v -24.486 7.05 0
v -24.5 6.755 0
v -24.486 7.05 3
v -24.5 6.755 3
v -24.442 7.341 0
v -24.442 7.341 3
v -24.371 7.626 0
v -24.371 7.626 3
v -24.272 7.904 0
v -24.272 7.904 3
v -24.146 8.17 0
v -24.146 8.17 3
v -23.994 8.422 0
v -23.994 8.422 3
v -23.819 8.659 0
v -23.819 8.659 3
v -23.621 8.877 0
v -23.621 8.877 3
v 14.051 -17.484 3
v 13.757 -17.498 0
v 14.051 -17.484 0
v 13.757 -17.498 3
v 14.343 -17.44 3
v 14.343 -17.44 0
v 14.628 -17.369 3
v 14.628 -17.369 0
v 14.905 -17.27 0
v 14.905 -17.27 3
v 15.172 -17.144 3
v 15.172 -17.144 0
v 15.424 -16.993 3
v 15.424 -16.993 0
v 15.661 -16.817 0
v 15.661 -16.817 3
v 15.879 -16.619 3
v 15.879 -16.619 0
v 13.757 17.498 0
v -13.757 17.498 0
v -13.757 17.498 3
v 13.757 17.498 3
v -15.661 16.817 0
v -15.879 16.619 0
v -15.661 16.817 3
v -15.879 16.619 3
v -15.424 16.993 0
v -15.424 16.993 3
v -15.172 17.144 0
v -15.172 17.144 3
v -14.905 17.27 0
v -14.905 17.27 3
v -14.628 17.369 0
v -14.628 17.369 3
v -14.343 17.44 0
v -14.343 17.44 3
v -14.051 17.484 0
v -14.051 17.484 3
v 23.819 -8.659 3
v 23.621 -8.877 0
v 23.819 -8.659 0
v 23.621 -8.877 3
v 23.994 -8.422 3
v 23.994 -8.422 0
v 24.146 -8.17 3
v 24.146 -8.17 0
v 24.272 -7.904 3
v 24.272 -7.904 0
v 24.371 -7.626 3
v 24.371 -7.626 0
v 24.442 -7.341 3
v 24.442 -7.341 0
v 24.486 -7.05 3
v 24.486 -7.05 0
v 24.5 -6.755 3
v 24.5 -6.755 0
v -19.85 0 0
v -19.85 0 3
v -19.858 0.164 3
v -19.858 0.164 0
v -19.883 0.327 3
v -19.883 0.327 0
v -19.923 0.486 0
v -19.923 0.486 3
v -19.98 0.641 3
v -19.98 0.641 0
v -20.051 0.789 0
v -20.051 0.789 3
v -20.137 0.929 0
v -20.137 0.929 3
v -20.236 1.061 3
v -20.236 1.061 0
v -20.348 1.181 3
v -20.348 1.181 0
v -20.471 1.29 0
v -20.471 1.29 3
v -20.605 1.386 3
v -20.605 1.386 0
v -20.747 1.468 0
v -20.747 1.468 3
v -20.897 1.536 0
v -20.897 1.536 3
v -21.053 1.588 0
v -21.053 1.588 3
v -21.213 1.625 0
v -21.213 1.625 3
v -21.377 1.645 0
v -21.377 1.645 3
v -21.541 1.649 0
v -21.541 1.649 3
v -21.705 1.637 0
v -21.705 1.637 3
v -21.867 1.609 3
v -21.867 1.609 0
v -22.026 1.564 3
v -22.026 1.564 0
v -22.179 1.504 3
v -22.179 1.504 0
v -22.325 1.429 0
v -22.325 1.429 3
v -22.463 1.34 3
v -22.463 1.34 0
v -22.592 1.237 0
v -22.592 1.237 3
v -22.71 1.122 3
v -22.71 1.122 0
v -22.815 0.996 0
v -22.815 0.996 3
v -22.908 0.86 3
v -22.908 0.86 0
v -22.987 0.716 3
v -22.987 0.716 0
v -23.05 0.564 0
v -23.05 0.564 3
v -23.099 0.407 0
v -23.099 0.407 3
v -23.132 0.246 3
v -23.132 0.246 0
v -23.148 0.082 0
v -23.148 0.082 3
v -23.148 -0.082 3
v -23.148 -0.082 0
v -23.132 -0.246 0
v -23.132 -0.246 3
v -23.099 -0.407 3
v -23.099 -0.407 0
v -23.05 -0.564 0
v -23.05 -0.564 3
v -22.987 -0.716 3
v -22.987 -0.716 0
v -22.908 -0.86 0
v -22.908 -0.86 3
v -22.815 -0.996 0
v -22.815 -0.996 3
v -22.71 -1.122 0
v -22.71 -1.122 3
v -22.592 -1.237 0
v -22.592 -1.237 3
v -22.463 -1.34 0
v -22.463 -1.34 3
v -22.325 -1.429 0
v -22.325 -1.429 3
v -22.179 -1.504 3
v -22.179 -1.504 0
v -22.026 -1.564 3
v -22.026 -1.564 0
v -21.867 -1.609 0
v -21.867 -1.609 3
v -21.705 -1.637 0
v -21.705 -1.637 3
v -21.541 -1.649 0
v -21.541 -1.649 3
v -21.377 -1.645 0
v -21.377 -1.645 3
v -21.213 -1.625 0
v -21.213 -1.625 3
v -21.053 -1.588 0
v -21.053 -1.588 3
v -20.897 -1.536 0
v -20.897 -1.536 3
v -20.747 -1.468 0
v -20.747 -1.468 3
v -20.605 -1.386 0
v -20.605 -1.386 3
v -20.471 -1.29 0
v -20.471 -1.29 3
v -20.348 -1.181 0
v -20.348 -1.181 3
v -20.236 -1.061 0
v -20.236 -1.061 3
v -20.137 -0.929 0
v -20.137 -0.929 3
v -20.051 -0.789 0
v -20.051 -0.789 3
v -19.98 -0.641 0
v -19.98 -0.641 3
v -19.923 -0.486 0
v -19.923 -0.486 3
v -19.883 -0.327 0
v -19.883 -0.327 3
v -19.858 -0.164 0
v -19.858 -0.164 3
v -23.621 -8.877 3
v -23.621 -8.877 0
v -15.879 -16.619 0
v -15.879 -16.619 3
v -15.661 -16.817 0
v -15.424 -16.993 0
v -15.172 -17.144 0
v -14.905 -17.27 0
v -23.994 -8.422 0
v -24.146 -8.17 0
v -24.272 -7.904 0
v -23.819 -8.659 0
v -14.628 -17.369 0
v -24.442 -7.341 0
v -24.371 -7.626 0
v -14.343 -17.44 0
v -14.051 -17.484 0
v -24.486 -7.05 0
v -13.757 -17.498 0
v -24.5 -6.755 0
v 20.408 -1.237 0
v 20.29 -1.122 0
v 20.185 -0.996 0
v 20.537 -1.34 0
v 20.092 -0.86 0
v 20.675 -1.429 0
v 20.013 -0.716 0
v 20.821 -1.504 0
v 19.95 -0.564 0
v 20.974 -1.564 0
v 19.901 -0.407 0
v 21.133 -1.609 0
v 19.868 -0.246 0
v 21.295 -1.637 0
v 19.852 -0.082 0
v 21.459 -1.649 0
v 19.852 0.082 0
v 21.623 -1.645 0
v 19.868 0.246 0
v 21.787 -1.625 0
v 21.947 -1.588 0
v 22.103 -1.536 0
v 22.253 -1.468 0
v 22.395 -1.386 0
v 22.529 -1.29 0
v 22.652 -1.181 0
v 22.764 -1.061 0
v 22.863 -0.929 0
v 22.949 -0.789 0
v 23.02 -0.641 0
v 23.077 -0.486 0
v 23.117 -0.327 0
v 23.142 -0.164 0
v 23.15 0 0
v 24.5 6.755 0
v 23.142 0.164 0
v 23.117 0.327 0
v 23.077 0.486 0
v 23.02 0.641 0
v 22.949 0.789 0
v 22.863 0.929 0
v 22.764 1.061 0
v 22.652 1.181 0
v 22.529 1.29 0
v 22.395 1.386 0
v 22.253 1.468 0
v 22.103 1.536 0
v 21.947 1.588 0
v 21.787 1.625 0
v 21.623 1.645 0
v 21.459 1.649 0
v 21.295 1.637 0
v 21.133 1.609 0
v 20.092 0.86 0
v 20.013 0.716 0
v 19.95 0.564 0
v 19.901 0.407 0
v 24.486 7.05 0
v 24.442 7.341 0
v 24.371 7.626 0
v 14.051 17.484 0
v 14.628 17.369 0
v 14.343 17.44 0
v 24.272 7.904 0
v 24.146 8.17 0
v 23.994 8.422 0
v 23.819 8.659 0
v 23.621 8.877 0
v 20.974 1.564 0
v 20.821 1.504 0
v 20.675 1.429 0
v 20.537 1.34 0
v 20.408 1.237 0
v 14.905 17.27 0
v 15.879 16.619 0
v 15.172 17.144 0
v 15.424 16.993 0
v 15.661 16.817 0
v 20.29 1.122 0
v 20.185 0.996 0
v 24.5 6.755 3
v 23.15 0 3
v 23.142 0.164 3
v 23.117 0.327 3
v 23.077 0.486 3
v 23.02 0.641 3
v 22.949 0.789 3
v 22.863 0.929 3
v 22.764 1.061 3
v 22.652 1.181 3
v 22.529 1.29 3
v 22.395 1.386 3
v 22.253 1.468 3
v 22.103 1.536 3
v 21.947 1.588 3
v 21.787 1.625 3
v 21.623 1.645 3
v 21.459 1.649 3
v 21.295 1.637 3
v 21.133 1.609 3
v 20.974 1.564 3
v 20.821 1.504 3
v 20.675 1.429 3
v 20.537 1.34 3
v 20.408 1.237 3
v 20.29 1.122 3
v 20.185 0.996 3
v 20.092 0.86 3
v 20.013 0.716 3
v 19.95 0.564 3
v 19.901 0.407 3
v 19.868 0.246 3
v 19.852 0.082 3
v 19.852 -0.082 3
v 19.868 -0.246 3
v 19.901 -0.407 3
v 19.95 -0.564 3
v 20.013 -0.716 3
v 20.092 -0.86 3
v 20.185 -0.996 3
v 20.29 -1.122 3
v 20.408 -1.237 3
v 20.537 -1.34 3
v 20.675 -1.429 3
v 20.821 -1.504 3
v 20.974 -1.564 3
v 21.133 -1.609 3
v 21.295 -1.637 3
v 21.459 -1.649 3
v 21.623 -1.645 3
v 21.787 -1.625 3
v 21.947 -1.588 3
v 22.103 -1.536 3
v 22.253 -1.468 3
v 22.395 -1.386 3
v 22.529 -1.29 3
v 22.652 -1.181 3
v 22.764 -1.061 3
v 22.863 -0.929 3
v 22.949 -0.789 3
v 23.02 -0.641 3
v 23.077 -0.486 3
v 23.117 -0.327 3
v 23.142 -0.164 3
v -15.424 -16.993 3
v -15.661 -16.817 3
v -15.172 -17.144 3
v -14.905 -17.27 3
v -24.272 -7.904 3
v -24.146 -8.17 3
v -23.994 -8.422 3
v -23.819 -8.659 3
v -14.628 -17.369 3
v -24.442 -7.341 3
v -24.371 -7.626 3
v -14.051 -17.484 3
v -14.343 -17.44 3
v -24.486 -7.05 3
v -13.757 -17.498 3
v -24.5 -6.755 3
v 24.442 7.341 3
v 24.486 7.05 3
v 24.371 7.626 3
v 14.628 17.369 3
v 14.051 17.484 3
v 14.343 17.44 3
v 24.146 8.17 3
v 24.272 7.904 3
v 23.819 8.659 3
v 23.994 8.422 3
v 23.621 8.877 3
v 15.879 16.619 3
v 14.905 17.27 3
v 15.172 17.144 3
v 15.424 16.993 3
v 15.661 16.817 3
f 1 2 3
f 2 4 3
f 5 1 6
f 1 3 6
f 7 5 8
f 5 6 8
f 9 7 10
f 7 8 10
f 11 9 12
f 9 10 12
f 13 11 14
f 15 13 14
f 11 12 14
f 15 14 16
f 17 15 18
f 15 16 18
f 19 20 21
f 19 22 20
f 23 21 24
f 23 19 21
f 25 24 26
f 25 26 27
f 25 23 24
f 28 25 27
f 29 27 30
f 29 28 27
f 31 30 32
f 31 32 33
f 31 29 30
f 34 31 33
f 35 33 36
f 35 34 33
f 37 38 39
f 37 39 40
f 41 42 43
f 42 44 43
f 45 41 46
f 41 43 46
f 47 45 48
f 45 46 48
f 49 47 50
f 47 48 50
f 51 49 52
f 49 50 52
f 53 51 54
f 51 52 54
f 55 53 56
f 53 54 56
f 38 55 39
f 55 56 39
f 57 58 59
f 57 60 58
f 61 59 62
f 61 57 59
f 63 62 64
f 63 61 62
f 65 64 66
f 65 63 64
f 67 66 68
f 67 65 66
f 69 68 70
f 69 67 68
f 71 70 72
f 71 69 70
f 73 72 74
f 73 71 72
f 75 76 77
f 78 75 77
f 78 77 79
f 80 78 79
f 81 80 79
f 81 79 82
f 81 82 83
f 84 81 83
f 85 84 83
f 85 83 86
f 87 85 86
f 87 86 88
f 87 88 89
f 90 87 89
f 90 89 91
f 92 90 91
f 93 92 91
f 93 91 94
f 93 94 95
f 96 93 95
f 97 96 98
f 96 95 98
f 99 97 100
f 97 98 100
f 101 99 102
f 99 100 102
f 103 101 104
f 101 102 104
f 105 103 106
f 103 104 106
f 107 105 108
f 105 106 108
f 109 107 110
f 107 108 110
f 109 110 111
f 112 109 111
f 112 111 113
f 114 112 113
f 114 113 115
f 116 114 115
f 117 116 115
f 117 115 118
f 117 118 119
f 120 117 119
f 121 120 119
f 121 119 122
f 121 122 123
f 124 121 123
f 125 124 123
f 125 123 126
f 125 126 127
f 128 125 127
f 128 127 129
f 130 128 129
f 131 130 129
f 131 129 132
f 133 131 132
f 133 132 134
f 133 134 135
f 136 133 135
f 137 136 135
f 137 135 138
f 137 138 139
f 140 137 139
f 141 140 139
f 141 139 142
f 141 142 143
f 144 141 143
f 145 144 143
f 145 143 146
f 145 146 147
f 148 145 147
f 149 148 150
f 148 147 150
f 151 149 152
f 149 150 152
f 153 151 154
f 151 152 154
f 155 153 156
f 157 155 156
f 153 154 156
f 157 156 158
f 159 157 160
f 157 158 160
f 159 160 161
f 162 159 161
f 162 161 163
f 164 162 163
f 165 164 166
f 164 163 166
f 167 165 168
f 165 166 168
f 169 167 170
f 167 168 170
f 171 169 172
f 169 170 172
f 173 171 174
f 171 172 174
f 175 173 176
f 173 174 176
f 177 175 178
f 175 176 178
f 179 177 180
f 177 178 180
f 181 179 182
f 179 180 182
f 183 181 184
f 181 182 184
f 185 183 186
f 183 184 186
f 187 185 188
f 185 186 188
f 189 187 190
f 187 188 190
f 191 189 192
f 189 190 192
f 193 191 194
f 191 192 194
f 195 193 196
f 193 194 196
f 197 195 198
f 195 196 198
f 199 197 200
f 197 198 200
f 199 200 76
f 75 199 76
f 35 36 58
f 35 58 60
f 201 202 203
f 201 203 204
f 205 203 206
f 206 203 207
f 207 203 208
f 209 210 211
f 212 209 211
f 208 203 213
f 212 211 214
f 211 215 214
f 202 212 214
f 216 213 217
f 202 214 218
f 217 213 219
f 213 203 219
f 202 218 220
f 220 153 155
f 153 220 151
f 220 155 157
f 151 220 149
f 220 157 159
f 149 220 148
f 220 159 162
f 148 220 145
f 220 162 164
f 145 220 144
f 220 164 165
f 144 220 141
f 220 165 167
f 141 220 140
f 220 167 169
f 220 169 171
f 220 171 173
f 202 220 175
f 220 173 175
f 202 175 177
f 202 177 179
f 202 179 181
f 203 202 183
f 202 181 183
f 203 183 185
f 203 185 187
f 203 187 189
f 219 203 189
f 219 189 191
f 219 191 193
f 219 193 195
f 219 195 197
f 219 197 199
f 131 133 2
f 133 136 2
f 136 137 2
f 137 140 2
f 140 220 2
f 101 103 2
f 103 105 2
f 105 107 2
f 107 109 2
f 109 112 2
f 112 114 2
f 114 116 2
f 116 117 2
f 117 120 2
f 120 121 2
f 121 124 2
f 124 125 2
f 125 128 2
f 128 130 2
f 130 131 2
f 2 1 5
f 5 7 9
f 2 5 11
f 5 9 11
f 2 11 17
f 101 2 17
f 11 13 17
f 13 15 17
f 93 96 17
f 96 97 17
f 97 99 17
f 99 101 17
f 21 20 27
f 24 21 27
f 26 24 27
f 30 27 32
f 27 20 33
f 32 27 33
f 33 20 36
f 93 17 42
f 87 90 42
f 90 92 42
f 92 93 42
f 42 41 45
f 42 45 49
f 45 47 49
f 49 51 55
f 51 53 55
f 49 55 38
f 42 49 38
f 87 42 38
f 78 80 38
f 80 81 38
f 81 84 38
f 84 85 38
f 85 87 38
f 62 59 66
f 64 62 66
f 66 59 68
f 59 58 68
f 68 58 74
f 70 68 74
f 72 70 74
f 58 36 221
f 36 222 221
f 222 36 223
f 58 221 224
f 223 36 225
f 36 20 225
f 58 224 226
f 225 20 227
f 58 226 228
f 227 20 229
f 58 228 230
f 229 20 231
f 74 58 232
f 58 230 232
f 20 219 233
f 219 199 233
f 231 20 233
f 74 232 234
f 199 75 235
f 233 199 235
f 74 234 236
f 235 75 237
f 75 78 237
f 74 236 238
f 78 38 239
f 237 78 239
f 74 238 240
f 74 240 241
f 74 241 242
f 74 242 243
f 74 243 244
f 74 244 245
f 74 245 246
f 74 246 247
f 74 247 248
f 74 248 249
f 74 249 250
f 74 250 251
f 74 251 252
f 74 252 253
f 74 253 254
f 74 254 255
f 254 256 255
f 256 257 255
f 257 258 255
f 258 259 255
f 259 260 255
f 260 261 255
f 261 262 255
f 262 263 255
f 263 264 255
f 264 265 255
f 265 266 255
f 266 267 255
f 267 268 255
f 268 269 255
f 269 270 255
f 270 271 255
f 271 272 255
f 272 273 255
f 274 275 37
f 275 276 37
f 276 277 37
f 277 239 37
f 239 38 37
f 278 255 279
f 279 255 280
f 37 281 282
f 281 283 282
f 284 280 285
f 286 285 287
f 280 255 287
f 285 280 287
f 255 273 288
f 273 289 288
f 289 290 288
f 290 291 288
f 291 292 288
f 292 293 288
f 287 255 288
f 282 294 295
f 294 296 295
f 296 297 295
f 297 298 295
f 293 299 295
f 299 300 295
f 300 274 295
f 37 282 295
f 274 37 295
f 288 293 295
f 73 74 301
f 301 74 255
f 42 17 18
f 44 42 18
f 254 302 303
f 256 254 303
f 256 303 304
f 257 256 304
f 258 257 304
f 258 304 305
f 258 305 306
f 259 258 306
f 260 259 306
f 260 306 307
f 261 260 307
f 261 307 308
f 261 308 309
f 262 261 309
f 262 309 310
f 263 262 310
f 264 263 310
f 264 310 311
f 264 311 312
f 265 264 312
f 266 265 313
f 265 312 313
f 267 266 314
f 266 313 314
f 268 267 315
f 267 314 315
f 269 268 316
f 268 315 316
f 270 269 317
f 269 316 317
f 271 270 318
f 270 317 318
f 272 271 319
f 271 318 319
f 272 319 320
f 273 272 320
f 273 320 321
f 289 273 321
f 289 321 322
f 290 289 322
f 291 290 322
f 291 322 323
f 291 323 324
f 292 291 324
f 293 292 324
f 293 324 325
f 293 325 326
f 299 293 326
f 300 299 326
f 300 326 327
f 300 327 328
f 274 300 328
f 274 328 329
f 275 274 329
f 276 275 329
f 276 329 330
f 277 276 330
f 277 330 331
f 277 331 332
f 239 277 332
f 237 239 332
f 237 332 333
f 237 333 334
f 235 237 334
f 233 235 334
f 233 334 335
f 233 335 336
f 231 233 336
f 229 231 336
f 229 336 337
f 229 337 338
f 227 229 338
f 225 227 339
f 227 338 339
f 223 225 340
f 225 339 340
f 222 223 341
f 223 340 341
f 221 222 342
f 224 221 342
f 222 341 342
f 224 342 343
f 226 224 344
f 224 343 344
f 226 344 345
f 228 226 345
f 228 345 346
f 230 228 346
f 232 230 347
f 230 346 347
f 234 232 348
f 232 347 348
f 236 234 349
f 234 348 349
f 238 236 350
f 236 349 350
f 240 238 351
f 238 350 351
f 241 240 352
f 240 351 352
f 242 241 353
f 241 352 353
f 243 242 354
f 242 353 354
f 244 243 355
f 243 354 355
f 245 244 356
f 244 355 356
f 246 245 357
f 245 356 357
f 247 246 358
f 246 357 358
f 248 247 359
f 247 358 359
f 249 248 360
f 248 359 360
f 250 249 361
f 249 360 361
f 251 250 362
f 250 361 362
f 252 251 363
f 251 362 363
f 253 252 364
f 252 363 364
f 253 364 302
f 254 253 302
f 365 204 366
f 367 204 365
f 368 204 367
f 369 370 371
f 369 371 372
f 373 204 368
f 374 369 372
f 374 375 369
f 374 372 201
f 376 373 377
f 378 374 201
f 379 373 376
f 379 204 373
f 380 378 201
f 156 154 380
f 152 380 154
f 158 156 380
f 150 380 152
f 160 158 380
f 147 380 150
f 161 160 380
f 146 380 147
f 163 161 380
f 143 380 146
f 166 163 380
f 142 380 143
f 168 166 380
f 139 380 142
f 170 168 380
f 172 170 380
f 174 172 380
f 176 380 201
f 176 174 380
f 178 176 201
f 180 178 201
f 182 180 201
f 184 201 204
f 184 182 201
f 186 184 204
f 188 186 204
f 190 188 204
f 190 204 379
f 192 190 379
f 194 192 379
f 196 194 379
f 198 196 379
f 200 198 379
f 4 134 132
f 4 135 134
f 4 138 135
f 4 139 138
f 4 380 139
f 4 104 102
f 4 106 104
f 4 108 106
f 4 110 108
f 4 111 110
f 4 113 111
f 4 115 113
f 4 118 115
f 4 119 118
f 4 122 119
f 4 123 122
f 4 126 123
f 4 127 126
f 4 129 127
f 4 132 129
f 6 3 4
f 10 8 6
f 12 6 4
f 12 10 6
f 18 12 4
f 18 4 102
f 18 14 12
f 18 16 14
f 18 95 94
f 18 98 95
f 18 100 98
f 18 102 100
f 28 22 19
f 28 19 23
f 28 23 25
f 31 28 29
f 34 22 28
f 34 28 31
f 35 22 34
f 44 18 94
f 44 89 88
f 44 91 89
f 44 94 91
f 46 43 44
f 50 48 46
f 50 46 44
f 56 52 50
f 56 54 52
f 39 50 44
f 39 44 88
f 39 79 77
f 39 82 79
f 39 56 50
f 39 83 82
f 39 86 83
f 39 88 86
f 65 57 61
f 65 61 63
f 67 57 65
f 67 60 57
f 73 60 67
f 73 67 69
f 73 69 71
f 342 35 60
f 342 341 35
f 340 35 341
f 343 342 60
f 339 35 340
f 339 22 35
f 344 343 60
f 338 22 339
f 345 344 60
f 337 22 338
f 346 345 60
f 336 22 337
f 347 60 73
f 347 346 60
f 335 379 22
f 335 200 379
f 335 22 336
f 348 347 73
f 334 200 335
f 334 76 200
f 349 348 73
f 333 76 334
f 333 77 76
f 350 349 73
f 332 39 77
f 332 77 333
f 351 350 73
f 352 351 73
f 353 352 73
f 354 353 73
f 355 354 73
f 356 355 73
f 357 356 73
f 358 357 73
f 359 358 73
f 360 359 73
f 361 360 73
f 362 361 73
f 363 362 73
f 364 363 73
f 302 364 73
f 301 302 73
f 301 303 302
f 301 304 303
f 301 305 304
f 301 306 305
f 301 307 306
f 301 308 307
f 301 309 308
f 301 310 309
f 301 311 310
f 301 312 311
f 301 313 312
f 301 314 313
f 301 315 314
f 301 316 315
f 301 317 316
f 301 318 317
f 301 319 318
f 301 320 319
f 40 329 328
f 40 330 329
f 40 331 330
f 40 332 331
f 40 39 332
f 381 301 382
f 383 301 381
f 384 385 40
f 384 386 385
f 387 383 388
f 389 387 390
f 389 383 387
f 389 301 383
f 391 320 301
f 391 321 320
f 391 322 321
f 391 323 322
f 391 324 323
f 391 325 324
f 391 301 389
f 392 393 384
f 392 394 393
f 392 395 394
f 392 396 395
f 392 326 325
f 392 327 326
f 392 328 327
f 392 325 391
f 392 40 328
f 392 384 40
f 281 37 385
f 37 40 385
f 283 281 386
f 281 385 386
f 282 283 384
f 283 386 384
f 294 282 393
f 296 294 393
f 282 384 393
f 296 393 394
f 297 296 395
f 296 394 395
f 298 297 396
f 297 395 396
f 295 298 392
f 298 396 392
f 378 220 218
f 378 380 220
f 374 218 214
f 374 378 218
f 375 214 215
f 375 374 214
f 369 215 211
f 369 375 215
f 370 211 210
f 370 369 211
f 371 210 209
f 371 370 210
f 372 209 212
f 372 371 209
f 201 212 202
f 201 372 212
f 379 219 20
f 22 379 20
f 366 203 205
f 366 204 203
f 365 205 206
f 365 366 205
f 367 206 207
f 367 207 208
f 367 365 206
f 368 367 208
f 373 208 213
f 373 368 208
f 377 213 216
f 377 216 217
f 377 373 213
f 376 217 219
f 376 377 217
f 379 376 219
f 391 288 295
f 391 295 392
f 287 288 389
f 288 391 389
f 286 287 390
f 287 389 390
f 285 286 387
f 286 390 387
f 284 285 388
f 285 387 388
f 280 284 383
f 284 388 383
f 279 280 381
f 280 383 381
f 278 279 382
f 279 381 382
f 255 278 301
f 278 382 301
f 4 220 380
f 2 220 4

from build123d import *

# Parameters (mm, degrees)
SKETCH_1_W          = 49
SKETCH_1_H          = 34.996183206
EXTRUDE_1_DEPTH     = 3
CHAMFER_1_SIZE      = 9.5
FILLET_1_R          = 3
SKETCH_2_R          = 1.65
CUT_EXTRUDE_1_DEPTH = 4


with BuildPart() as part:
    # 草图1 → 凸台-拉伸1 (new body)
    with BuildSketch(Plane.XY):
        Rectangle(SKETCH_1_W, SKETCH_1_H)
    extrude(amount=EXTRUDE_1_DEPTH)

    # 倒角1
    chamfer_1_edges = [part.edges().sort_by_distance(p)[0] for p in [
        (24.5, -17.498091603, 1.5),
        (-24.5, -17.498091603, 1.5),
        (-24.5, 17.498091603, 1.5),
        (24.5, 17.498091603, 1.5),
    ]]
    chamfer(chamfer_1_edges, length=CHAMFER_1_SIZE)

    # 圆角1
    fillet_1_edges = [part.edges().sort_by_distance(p)[0] for p in [
        (-24.5, -7.998091603, 1.5),
        (-24.5, 7.998091603, 1.5),
        (15, 17.498091603, 1.5),
        (-15, 17.498091603, 1.5),
        (15, -17.498091603, 1.5),
        (-15, -17.498091603, 1.5),
        (24.5, 7.998091603, 1.5),
        (24.5, -7.998091603, 1.5),
    ]]
    fillet(fillet_1_edges, radius=FILLET_1_R)

    # 草图2 → 切除-拉伸1 (cut, through all)
    with BuildSketch(Plane.XY.offset(3)):
        with Locations((-21.5, 0)):
            Circle(SKETCH_2_R)
        with Locations((21.5, 0)):
            Circle(SKETCH_2_R)
    extrude(amount=-CUT_EXTRUDE_1_DEPTH, mode=Mode.SUBTRACT)


solid = part.part
